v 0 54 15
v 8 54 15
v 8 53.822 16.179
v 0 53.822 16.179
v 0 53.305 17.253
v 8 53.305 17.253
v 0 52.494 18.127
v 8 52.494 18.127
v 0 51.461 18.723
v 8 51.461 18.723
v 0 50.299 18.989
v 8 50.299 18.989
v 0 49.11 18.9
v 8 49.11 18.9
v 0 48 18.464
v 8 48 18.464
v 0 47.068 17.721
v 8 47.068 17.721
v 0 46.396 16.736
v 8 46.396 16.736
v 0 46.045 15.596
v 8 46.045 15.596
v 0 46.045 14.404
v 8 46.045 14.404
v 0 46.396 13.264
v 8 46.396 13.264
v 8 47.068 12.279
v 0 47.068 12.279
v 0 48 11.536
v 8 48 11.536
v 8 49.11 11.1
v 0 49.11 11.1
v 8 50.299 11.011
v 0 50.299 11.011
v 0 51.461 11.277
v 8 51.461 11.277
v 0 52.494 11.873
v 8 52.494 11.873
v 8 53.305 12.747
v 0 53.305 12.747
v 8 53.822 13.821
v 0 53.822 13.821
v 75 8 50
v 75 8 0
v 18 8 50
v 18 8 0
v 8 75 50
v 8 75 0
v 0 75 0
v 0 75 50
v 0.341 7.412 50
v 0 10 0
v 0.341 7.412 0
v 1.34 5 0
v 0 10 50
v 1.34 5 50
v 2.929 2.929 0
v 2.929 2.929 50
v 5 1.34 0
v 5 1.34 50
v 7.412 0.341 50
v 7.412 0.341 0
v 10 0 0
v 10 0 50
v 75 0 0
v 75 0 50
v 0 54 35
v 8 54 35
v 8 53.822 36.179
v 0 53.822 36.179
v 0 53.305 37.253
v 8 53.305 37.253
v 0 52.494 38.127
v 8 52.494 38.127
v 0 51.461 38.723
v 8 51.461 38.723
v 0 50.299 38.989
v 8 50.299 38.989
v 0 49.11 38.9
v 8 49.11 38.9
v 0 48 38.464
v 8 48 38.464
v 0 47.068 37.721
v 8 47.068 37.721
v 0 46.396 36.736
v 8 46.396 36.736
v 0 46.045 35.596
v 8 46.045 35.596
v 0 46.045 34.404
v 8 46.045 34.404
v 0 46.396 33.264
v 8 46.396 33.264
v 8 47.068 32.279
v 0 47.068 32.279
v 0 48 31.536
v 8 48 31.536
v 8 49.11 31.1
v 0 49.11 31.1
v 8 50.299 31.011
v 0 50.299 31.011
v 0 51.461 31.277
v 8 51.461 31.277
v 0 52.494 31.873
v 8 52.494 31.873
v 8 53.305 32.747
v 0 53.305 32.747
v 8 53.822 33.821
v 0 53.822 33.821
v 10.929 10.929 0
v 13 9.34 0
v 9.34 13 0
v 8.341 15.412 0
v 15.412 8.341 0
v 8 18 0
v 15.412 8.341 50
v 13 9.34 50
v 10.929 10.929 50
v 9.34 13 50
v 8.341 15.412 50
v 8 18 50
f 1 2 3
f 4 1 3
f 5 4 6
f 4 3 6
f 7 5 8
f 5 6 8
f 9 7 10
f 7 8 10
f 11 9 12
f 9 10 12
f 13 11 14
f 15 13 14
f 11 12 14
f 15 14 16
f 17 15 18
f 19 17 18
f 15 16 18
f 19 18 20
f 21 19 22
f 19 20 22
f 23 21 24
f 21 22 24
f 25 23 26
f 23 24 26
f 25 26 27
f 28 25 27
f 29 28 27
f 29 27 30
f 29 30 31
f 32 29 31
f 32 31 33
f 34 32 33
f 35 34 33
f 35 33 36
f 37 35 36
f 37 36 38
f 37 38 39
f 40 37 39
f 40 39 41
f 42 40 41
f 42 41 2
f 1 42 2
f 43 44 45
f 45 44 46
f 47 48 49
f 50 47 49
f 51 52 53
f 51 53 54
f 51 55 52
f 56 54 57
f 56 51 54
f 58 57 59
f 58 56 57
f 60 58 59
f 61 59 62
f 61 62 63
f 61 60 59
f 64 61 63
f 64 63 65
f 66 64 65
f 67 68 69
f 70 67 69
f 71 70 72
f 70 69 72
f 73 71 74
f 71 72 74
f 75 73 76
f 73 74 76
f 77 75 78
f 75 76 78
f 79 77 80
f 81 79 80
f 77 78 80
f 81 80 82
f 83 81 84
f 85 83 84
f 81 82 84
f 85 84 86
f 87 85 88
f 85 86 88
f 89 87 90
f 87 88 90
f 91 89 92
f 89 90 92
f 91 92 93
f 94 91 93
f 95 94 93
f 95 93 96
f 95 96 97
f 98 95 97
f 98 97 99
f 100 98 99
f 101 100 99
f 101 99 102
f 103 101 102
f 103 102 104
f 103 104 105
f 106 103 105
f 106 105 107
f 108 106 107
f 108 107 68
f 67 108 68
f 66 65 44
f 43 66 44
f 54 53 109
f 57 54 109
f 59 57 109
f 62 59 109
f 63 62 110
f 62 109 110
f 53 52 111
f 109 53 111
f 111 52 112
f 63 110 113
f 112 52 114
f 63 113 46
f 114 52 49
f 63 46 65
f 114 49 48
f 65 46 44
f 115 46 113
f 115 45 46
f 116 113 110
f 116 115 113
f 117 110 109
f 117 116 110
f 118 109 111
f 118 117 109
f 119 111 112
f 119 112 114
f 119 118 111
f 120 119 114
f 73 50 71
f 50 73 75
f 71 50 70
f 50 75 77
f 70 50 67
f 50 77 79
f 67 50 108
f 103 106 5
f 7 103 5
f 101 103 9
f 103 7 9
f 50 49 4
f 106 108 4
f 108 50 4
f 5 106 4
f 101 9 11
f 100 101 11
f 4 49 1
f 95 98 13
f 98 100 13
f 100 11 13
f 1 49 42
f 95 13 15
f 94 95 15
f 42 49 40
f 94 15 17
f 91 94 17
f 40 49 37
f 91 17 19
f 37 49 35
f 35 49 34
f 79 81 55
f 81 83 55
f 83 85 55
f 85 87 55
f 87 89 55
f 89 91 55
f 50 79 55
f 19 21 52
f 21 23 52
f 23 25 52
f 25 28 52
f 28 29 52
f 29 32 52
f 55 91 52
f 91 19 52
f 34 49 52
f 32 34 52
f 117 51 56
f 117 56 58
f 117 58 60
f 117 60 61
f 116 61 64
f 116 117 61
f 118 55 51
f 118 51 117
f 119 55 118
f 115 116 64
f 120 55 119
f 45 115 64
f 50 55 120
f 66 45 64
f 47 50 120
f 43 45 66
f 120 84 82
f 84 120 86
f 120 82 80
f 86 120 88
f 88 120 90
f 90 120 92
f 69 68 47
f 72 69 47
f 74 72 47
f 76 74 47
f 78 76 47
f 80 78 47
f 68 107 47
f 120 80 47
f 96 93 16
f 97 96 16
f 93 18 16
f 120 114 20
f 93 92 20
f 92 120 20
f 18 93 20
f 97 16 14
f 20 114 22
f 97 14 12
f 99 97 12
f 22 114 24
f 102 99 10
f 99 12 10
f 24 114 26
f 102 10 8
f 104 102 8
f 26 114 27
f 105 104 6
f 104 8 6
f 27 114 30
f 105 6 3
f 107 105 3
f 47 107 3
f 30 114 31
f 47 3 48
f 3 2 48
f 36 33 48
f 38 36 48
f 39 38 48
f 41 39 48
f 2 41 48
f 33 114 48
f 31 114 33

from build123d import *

# Parameters (mm, degrees)
F1_DEPTH = 50
F2_R     = 10
F3_R     = 4
F4_DEPTH = 8.001


with BuildPart() as f1:
    # F0 (on Top) → F1 (new body)
    with BuildSketch(Plane.XY):
        Polygon((8, 75), (0, 75), (0, 0), (75, 0), (75, 8), (8, 8), align=None)
    extrude(amount=F1_DEPTH)

    # F2
    f2_edges = [f1.edges().sort_by_distance(p)[0] for p in [
        (8, 8, 25),
        (0, 0, 25),
    ]]
    fillet(f2_edges, radius=F2_R)

    # F3 (on face) → F4 (cut, through all)
    with BuildSketch(Plane.YZ.offset(8)):
        with Locations((50, 35)):
            Circle(F3_R)
        with Locations((50, 15)):
            Circle(F3_R)
    extrude(amount=-F4_DEPTH, mode=Mode.SUBTRACT)


solid = f1.part
